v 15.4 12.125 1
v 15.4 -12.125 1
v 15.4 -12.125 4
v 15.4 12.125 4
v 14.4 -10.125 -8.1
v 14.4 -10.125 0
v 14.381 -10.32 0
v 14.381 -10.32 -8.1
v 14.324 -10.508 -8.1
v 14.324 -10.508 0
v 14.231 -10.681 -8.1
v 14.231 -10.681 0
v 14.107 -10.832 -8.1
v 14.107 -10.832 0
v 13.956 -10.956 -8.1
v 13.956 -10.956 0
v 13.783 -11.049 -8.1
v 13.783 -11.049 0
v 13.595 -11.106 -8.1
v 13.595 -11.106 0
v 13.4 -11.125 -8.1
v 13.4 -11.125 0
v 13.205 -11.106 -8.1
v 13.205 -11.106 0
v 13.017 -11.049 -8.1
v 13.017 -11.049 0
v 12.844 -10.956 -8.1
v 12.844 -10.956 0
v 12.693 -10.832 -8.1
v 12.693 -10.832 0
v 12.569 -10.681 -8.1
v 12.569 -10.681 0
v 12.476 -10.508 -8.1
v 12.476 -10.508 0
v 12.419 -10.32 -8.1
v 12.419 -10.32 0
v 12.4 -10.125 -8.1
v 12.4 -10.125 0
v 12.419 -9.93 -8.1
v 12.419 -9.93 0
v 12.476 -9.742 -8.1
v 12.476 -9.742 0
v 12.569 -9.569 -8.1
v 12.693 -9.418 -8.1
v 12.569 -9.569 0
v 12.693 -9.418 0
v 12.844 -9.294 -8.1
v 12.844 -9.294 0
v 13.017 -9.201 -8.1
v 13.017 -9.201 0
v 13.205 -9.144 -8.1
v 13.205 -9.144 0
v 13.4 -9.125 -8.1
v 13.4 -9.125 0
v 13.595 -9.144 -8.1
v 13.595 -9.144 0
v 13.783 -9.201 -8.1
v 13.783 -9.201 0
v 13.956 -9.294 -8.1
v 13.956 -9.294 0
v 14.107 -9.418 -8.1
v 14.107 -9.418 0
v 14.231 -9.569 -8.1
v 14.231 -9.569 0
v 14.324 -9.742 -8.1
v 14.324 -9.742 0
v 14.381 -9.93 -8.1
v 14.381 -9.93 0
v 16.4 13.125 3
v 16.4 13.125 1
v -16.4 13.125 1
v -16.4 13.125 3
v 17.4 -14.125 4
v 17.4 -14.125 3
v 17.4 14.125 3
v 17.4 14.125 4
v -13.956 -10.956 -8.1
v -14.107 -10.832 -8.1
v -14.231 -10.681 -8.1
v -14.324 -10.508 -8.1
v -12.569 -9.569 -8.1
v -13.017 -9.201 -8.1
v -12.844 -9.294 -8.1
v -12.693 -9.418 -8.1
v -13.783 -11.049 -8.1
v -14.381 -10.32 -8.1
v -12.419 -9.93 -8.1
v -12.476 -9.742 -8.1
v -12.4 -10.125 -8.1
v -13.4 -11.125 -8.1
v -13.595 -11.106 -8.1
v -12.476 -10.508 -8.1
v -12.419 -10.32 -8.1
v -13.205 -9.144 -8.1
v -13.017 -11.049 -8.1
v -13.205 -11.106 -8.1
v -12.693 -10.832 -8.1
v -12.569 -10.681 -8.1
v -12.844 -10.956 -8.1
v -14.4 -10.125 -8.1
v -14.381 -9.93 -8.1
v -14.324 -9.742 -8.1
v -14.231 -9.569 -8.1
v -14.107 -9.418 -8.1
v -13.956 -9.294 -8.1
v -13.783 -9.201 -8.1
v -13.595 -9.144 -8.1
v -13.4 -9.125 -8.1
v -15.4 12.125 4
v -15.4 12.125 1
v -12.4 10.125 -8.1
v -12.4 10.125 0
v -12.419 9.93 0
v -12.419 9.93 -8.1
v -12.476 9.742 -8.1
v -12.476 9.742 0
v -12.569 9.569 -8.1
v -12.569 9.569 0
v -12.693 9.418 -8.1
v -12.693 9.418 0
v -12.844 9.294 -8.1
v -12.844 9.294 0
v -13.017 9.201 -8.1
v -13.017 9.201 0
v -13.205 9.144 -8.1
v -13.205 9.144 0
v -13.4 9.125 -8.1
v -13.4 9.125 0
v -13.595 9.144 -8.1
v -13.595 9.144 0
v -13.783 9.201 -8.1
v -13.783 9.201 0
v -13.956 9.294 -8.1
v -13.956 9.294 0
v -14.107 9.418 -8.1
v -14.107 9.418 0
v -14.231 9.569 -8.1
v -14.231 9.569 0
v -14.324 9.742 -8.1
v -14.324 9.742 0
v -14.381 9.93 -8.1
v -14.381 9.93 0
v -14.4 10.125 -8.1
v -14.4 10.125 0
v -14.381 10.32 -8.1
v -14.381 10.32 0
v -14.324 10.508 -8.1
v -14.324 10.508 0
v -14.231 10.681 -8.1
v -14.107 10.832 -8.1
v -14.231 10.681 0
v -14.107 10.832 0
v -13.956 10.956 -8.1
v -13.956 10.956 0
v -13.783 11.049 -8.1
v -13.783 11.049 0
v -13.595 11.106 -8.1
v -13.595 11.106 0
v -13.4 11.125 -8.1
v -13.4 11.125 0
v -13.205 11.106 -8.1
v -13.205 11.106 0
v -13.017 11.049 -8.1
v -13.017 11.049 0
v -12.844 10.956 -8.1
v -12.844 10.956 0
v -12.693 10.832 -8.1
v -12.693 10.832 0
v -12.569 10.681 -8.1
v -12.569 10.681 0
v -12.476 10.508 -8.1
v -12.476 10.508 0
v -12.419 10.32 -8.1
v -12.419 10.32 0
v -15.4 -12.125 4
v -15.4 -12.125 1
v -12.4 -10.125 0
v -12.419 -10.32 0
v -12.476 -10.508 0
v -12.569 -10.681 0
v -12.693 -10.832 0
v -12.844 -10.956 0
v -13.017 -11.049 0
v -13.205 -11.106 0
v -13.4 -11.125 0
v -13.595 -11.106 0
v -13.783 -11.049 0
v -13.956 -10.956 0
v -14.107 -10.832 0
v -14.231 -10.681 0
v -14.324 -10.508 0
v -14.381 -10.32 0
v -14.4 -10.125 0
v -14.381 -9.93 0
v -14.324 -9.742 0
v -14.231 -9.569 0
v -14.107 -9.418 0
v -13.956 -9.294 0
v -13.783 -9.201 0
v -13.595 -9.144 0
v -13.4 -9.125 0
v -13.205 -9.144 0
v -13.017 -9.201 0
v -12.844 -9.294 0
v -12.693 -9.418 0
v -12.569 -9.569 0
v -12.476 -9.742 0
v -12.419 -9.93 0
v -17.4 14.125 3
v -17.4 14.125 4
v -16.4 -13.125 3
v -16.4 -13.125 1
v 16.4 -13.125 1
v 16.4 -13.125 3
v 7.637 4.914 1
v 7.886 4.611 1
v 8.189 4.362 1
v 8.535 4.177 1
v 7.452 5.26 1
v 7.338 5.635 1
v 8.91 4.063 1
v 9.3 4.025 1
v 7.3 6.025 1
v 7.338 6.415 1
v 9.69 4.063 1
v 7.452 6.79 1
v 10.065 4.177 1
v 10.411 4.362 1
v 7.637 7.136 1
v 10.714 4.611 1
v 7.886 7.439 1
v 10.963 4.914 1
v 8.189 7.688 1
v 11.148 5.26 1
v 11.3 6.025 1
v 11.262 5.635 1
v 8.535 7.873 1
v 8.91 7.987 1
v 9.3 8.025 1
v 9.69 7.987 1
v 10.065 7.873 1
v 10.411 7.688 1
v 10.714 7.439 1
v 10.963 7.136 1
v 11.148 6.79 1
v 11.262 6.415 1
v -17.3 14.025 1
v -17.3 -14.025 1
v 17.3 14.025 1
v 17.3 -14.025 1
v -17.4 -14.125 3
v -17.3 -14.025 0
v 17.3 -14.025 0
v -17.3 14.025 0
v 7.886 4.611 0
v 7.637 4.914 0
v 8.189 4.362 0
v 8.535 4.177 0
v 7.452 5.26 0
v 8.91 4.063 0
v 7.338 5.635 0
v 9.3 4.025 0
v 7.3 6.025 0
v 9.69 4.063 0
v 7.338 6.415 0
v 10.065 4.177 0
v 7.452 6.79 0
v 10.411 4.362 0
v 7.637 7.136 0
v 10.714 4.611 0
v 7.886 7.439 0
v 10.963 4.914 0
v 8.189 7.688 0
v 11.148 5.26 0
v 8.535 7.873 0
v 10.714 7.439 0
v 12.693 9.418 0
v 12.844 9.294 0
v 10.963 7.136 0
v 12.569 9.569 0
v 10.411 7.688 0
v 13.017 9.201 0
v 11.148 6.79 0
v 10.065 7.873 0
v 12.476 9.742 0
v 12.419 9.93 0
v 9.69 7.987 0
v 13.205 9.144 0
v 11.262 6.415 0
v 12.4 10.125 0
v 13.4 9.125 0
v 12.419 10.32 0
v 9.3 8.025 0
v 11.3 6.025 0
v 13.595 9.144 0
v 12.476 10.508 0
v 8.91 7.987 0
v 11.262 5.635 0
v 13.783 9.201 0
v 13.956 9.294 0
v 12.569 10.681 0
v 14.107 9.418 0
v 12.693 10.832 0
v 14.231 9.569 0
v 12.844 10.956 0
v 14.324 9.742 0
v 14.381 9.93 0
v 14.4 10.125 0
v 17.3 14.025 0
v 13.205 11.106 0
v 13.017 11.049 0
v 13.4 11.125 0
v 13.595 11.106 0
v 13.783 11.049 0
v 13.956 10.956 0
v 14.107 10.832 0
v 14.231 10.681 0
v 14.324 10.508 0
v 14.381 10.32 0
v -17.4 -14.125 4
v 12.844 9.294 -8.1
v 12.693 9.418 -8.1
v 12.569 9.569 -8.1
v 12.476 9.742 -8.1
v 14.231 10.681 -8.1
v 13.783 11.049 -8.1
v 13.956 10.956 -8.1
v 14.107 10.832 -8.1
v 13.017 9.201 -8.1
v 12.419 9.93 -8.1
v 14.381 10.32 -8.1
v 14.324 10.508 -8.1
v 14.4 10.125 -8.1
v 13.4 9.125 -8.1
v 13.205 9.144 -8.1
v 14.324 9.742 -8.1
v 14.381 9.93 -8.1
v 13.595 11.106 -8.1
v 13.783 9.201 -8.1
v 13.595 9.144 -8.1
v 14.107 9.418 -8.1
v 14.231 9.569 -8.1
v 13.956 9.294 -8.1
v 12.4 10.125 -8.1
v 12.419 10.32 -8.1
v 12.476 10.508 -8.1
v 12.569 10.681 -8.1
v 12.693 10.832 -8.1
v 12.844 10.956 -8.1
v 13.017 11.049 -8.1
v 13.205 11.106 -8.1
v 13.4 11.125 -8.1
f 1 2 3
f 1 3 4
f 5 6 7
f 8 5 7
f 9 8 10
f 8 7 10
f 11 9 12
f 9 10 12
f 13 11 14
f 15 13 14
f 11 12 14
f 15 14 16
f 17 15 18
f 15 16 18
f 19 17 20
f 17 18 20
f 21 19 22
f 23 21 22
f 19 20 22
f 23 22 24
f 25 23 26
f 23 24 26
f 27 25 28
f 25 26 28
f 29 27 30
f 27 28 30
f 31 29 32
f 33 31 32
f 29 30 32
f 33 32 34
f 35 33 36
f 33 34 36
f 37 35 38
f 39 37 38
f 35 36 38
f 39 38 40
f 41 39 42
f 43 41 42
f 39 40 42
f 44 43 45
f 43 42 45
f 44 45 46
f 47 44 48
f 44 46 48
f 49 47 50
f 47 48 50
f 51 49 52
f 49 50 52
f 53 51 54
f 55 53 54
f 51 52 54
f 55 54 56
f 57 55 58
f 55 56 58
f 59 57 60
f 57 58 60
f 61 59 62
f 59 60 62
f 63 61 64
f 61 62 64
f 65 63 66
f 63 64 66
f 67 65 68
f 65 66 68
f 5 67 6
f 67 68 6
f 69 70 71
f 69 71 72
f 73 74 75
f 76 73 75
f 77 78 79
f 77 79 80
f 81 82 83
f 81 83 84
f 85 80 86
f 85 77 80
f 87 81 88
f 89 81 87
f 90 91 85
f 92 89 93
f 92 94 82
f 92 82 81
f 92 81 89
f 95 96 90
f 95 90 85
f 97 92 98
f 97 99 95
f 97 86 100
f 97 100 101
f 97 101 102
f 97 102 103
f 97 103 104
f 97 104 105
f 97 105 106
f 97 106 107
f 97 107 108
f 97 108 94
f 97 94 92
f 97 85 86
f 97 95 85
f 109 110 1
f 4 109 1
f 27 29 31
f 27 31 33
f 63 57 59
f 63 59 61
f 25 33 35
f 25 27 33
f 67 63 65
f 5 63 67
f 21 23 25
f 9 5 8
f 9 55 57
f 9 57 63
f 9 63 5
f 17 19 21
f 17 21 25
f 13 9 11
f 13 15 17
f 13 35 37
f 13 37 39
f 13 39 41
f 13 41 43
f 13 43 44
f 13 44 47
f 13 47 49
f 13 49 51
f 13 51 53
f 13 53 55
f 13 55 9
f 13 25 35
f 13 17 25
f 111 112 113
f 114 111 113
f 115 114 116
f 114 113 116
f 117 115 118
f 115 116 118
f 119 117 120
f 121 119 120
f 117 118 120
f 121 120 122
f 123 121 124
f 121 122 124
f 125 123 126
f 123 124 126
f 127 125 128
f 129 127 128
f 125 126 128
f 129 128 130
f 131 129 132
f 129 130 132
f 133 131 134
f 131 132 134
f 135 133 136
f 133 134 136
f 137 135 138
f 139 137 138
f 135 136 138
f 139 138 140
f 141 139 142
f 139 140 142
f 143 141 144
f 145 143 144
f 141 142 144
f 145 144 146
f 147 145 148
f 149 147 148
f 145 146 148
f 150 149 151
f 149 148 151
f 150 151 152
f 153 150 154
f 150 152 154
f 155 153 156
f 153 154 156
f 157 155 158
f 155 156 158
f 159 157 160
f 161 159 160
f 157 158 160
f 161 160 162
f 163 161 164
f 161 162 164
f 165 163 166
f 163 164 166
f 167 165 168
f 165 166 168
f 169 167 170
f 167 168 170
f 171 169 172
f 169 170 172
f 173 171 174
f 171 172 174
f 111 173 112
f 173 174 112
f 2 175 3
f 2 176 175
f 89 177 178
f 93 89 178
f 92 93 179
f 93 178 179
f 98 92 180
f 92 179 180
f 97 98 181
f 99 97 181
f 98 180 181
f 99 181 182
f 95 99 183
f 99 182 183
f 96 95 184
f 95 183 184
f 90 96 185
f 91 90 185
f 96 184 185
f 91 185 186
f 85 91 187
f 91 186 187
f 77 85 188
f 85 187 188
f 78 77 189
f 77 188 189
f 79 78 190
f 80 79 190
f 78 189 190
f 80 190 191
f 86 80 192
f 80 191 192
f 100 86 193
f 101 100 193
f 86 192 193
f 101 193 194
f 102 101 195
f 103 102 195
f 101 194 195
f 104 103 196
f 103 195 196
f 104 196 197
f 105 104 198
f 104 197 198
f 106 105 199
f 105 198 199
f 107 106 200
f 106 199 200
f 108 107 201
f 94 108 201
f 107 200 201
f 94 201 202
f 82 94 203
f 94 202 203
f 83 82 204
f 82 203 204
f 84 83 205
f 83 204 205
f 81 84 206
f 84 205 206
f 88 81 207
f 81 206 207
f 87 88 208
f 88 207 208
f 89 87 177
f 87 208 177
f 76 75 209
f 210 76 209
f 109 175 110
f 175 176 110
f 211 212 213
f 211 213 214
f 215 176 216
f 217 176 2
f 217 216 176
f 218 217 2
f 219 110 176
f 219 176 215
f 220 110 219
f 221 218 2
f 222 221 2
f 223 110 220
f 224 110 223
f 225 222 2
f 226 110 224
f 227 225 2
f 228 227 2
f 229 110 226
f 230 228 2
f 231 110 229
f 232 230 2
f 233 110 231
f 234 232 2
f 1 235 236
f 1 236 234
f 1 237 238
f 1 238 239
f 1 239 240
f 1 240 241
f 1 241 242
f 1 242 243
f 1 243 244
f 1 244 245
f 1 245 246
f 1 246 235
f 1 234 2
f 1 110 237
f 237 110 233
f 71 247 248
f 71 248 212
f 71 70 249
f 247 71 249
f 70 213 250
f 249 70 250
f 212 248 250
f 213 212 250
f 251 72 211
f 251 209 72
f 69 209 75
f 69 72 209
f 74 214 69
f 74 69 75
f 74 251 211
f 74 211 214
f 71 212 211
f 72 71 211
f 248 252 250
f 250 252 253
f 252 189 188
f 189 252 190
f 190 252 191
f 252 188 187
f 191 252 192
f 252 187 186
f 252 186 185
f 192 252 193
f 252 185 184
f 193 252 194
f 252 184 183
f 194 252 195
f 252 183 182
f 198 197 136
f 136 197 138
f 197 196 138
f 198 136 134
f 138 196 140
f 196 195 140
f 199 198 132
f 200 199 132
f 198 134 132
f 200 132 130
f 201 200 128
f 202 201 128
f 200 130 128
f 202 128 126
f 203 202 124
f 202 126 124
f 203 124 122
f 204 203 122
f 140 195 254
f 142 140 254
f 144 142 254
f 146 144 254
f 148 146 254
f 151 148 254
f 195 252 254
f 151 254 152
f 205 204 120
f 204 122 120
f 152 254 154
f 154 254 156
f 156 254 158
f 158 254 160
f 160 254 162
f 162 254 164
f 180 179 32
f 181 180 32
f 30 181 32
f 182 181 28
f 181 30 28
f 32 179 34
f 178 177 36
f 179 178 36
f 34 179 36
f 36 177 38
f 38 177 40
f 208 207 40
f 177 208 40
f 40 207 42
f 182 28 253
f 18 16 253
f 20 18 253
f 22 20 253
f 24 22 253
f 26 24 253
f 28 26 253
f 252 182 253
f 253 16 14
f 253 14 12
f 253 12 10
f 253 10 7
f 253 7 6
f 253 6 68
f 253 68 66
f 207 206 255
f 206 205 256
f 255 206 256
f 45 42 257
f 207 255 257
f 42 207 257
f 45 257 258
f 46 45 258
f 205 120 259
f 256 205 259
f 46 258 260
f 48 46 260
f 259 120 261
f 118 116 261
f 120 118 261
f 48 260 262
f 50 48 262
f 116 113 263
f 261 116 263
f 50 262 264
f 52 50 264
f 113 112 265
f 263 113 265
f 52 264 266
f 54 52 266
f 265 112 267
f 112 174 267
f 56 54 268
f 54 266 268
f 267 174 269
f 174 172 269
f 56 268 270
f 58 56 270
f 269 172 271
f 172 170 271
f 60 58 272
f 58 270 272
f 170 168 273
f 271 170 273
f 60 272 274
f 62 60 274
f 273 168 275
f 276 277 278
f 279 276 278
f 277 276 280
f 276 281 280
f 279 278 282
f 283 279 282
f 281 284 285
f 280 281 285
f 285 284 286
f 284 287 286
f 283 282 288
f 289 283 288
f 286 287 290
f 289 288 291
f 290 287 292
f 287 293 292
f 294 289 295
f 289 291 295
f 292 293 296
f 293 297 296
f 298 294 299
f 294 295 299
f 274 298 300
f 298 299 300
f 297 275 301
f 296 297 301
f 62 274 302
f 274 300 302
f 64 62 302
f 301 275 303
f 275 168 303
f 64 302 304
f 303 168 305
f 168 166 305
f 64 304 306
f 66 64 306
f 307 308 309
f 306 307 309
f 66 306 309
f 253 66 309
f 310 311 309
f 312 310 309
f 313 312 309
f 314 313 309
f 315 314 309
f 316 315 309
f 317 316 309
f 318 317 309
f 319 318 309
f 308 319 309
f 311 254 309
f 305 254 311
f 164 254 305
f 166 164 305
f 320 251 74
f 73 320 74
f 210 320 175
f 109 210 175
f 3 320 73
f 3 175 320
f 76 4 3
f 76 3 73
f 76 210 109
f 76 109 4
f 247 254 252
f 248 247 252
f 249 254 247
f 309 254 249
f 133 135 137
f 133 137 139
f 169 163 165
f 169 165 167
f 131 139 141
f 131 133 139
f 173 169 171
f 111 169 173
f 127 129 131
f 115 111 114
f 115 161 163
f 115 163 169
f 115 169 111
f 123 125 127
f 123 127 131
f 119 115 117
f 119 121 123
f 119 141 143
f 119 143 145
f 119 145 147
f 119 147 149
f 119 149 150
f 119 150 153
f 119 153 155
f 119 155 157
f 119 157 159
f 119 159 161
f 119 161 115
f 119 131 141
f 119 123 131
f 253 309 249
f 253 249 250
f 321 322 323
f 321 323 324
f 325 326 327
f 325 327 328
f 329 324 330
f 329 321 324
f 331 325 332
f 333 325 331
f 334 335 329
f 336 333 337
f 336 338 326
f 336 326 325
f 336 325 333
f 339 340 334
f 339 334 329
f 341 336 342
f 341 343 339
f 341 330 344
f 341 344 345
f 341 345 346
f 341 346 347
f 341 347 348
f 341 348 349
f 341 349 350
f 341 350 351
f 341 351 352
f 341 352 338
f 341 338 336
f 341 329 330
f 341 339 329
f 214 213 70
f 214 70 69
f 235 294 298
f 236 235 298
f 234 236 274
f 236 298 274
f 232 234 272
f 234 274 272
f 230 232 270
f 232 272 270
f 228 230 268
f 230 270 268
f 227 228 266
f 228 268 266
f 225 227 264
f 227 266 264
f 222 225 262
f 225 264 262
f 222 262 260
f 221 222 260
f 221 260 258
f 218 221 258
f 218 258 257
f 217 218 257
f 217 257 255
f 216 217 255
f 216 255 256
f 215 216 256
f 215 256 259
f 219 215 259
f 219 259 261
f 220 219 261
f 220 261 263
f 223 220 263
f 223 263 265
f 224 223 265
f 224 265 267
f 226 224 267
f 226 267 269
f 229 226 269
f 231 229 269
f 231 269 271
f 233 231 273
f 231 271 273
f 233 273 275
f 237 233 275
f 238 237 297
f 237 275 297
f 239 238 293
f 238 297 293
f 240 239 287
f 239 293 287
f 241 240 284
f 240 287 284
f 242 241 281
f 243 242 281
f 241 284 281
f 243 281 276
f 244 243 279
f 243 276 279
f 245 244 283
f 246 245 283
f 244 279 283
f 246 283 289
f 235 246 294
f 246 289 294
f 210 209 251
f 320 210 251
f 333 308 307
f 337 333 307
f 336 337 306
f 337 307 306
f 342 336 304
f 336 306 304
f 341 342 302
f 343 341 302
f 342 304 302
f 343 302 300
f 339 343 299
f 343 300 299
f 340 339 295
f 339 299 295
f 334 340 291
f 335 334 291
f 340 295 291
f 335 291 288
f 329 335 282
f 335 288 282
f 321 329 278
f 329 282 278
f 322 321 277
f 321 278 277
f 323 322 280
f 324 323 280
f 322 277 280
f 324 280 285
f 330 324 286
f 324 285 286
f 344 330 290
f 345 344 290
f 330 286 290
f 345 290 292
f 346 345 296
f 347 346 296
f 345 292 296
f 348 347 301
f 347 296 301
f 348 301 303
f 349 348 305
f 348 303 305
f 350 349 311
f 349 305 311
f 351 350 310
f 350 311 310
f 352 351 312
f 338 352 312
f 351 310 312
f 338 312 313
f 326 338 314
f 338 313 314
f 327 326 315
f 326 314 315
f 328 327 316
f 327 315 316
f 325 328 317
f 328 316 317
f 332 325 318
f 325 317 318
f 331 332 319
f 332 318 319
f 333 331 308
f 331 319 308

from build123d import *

# Parameters (mm, degrees)
F1_DEPTH  = 2.5
F2_W      = 30.8
F2_H      = 24.25
F3_DEPTH  = 1.5
F4_DEPTH  = 1.5
F5_W      = 1
F5_H      = 2
F6_DEPTH  = 28.251
F7_W      = 1
F7_H      = 2
F8_DEPTH  = 28.251
F9_W      = 1
F9_H      = 2
F10_DEPTH = 33.801
F11_W     = 1
F11_H     = 2
F12_DEPTH = 33.801
F15_R     = 1
F13_R     = 1
F16_R     = 1
F17_DEPTH = 8.1
F18_W     = 34.8
F18_H     = 28.25
F18_W_2   = 34.6
F18_H_2   = 28.05
F19_DEPTH = 1
F20_R     = 2
F21_DEPTH = 4.001


with BuildPart() as f1:
    # F0 (on Top) → F1 (new body)
    with BuildSketch(Plane.XY):
        Polygon((-17.4, 14.125), (-17.4, -14.125), (0, 0), align=None)
        Polygon((0, 0), (-17.4, -14.125), (17.4, -14.125), align=None)
        Polygon((0, 0), (17.4, -14.125), (17.4, 14.125), align=None)
        Polygon((17.4, 14.125), (-17.4, 14.125), (0, 0), align=None)
    extrude(amount=F1_DEPTH)

    # F2 (on face) → F3 (cut)
    with BuildSketch(Plane.XY.offset(2.5)):
        Rectangle(F2_W, F2_H)
    extrude(amount=-F3_DEPTH, mode=Mode.SUBTRACT)

    # F4 (add): a face of the model
    f4_faces = [f1.faces().sort_by_distance(p)[0] for p in [
        (-16.9517698694, 0, 2.5),
    ]]
    extrude(f4_faces, amount=F4_DEPTH)

    # F5 (on face) → F6 (cut, through all)
    with BuildSketch(Plane.XZ.offset(14.125)):
        with Locations((-16.9, 2)):
            Rectangle(F5_W, F5_H)
    extrude(amount=-F6_DEPTH, mode=Mode.SUBTRACT)

    # F7 (on face) → F8 (cut, through all)
    with BuildSketch(Plane.XZ.offset(14.125)):
        with Locations((16.9, 2)):
            Rectangle(F7_W, F7_H)
    extrude(amount=-F8_DEPTH, mode=Mode.SUBTRACT)

    # F9 (on face) → F10 (cut, through all)
    with BuildSketch(Plane(origin=(-16.4, 0, 0), x_dir=(0, -1, 0), z_dir=(-1, 0, 0))):
        with Locations((13.625, 2)):
            Rectangle(F9_W, F9_H)
    extrude(amount=-F10_DEPTH, mode=Mode.SUBTRACT)

    # F11 (on face) → F12 (cut, through all)
    with BuildSketch(Plane.YZ.offset(16.4)):
        with Locations((13.625, 2)):
            Rectangle(F11_W, F11_H)
    extrude(amount=-F12_DEPTH, mode=Mode.SUBTRACT)

    # F15 (on face) + F13 (on face) + F16 (on face) → F17 (join)
    with BuildSketch(Plane(origin=(0, 0, 0), x_dir=(1, 0, 0), z_dir=(0, 0, -1))):
        with Locations((-13.4, -10.125)):
            Circle(F15_R)
        with Locations((-13.4, 10.125)):
            Circle(F15_R)
    with BuildSketch(Plane(origin=(0, 0, 0), x_dir=(1, 0, 0), z_dir=(0, 0, -1))):
        with Locations((13.4, -10.125)):
            Circle(F13_R)
    with BuildSketch(Plane(origin=(0, 0, 0), x_dir=(1, 0, 0), z_dir=(0, 0, -1))):
        with Locations((13.4, 10.125)):
            Circle(F16_R)
    extrude(amount=F17_DEPTH)

    # F18 (on face) → F19 (cut, through all)
    with BuildSketch(Plane(origin=(0, 0, 0), x_dir=(1, 0, 0), z_dir=(0, 0, -1))):
        Rectangle(F18_W, F18_H)
        Rectangle(F18_W_2, F18_H_2, mode=Mode.SUBTRACT)
    extrude(amount=-F19_DEPTH, mode=Mode.SUBTRACT)

    # F20 (on face) → F21 (cut, through all)
    with BuildSketch(Plane(origin=(0, 0, 0), x_dir=(1, 0, 0), z_dir=(0, 0, -1))):
        with Locations((9.3, -6.025)):
            Circle(F20_R)
    extrude(amount=-F21_DEPTH, mode=Mode.SUBTRACT)


solid = f1.part
